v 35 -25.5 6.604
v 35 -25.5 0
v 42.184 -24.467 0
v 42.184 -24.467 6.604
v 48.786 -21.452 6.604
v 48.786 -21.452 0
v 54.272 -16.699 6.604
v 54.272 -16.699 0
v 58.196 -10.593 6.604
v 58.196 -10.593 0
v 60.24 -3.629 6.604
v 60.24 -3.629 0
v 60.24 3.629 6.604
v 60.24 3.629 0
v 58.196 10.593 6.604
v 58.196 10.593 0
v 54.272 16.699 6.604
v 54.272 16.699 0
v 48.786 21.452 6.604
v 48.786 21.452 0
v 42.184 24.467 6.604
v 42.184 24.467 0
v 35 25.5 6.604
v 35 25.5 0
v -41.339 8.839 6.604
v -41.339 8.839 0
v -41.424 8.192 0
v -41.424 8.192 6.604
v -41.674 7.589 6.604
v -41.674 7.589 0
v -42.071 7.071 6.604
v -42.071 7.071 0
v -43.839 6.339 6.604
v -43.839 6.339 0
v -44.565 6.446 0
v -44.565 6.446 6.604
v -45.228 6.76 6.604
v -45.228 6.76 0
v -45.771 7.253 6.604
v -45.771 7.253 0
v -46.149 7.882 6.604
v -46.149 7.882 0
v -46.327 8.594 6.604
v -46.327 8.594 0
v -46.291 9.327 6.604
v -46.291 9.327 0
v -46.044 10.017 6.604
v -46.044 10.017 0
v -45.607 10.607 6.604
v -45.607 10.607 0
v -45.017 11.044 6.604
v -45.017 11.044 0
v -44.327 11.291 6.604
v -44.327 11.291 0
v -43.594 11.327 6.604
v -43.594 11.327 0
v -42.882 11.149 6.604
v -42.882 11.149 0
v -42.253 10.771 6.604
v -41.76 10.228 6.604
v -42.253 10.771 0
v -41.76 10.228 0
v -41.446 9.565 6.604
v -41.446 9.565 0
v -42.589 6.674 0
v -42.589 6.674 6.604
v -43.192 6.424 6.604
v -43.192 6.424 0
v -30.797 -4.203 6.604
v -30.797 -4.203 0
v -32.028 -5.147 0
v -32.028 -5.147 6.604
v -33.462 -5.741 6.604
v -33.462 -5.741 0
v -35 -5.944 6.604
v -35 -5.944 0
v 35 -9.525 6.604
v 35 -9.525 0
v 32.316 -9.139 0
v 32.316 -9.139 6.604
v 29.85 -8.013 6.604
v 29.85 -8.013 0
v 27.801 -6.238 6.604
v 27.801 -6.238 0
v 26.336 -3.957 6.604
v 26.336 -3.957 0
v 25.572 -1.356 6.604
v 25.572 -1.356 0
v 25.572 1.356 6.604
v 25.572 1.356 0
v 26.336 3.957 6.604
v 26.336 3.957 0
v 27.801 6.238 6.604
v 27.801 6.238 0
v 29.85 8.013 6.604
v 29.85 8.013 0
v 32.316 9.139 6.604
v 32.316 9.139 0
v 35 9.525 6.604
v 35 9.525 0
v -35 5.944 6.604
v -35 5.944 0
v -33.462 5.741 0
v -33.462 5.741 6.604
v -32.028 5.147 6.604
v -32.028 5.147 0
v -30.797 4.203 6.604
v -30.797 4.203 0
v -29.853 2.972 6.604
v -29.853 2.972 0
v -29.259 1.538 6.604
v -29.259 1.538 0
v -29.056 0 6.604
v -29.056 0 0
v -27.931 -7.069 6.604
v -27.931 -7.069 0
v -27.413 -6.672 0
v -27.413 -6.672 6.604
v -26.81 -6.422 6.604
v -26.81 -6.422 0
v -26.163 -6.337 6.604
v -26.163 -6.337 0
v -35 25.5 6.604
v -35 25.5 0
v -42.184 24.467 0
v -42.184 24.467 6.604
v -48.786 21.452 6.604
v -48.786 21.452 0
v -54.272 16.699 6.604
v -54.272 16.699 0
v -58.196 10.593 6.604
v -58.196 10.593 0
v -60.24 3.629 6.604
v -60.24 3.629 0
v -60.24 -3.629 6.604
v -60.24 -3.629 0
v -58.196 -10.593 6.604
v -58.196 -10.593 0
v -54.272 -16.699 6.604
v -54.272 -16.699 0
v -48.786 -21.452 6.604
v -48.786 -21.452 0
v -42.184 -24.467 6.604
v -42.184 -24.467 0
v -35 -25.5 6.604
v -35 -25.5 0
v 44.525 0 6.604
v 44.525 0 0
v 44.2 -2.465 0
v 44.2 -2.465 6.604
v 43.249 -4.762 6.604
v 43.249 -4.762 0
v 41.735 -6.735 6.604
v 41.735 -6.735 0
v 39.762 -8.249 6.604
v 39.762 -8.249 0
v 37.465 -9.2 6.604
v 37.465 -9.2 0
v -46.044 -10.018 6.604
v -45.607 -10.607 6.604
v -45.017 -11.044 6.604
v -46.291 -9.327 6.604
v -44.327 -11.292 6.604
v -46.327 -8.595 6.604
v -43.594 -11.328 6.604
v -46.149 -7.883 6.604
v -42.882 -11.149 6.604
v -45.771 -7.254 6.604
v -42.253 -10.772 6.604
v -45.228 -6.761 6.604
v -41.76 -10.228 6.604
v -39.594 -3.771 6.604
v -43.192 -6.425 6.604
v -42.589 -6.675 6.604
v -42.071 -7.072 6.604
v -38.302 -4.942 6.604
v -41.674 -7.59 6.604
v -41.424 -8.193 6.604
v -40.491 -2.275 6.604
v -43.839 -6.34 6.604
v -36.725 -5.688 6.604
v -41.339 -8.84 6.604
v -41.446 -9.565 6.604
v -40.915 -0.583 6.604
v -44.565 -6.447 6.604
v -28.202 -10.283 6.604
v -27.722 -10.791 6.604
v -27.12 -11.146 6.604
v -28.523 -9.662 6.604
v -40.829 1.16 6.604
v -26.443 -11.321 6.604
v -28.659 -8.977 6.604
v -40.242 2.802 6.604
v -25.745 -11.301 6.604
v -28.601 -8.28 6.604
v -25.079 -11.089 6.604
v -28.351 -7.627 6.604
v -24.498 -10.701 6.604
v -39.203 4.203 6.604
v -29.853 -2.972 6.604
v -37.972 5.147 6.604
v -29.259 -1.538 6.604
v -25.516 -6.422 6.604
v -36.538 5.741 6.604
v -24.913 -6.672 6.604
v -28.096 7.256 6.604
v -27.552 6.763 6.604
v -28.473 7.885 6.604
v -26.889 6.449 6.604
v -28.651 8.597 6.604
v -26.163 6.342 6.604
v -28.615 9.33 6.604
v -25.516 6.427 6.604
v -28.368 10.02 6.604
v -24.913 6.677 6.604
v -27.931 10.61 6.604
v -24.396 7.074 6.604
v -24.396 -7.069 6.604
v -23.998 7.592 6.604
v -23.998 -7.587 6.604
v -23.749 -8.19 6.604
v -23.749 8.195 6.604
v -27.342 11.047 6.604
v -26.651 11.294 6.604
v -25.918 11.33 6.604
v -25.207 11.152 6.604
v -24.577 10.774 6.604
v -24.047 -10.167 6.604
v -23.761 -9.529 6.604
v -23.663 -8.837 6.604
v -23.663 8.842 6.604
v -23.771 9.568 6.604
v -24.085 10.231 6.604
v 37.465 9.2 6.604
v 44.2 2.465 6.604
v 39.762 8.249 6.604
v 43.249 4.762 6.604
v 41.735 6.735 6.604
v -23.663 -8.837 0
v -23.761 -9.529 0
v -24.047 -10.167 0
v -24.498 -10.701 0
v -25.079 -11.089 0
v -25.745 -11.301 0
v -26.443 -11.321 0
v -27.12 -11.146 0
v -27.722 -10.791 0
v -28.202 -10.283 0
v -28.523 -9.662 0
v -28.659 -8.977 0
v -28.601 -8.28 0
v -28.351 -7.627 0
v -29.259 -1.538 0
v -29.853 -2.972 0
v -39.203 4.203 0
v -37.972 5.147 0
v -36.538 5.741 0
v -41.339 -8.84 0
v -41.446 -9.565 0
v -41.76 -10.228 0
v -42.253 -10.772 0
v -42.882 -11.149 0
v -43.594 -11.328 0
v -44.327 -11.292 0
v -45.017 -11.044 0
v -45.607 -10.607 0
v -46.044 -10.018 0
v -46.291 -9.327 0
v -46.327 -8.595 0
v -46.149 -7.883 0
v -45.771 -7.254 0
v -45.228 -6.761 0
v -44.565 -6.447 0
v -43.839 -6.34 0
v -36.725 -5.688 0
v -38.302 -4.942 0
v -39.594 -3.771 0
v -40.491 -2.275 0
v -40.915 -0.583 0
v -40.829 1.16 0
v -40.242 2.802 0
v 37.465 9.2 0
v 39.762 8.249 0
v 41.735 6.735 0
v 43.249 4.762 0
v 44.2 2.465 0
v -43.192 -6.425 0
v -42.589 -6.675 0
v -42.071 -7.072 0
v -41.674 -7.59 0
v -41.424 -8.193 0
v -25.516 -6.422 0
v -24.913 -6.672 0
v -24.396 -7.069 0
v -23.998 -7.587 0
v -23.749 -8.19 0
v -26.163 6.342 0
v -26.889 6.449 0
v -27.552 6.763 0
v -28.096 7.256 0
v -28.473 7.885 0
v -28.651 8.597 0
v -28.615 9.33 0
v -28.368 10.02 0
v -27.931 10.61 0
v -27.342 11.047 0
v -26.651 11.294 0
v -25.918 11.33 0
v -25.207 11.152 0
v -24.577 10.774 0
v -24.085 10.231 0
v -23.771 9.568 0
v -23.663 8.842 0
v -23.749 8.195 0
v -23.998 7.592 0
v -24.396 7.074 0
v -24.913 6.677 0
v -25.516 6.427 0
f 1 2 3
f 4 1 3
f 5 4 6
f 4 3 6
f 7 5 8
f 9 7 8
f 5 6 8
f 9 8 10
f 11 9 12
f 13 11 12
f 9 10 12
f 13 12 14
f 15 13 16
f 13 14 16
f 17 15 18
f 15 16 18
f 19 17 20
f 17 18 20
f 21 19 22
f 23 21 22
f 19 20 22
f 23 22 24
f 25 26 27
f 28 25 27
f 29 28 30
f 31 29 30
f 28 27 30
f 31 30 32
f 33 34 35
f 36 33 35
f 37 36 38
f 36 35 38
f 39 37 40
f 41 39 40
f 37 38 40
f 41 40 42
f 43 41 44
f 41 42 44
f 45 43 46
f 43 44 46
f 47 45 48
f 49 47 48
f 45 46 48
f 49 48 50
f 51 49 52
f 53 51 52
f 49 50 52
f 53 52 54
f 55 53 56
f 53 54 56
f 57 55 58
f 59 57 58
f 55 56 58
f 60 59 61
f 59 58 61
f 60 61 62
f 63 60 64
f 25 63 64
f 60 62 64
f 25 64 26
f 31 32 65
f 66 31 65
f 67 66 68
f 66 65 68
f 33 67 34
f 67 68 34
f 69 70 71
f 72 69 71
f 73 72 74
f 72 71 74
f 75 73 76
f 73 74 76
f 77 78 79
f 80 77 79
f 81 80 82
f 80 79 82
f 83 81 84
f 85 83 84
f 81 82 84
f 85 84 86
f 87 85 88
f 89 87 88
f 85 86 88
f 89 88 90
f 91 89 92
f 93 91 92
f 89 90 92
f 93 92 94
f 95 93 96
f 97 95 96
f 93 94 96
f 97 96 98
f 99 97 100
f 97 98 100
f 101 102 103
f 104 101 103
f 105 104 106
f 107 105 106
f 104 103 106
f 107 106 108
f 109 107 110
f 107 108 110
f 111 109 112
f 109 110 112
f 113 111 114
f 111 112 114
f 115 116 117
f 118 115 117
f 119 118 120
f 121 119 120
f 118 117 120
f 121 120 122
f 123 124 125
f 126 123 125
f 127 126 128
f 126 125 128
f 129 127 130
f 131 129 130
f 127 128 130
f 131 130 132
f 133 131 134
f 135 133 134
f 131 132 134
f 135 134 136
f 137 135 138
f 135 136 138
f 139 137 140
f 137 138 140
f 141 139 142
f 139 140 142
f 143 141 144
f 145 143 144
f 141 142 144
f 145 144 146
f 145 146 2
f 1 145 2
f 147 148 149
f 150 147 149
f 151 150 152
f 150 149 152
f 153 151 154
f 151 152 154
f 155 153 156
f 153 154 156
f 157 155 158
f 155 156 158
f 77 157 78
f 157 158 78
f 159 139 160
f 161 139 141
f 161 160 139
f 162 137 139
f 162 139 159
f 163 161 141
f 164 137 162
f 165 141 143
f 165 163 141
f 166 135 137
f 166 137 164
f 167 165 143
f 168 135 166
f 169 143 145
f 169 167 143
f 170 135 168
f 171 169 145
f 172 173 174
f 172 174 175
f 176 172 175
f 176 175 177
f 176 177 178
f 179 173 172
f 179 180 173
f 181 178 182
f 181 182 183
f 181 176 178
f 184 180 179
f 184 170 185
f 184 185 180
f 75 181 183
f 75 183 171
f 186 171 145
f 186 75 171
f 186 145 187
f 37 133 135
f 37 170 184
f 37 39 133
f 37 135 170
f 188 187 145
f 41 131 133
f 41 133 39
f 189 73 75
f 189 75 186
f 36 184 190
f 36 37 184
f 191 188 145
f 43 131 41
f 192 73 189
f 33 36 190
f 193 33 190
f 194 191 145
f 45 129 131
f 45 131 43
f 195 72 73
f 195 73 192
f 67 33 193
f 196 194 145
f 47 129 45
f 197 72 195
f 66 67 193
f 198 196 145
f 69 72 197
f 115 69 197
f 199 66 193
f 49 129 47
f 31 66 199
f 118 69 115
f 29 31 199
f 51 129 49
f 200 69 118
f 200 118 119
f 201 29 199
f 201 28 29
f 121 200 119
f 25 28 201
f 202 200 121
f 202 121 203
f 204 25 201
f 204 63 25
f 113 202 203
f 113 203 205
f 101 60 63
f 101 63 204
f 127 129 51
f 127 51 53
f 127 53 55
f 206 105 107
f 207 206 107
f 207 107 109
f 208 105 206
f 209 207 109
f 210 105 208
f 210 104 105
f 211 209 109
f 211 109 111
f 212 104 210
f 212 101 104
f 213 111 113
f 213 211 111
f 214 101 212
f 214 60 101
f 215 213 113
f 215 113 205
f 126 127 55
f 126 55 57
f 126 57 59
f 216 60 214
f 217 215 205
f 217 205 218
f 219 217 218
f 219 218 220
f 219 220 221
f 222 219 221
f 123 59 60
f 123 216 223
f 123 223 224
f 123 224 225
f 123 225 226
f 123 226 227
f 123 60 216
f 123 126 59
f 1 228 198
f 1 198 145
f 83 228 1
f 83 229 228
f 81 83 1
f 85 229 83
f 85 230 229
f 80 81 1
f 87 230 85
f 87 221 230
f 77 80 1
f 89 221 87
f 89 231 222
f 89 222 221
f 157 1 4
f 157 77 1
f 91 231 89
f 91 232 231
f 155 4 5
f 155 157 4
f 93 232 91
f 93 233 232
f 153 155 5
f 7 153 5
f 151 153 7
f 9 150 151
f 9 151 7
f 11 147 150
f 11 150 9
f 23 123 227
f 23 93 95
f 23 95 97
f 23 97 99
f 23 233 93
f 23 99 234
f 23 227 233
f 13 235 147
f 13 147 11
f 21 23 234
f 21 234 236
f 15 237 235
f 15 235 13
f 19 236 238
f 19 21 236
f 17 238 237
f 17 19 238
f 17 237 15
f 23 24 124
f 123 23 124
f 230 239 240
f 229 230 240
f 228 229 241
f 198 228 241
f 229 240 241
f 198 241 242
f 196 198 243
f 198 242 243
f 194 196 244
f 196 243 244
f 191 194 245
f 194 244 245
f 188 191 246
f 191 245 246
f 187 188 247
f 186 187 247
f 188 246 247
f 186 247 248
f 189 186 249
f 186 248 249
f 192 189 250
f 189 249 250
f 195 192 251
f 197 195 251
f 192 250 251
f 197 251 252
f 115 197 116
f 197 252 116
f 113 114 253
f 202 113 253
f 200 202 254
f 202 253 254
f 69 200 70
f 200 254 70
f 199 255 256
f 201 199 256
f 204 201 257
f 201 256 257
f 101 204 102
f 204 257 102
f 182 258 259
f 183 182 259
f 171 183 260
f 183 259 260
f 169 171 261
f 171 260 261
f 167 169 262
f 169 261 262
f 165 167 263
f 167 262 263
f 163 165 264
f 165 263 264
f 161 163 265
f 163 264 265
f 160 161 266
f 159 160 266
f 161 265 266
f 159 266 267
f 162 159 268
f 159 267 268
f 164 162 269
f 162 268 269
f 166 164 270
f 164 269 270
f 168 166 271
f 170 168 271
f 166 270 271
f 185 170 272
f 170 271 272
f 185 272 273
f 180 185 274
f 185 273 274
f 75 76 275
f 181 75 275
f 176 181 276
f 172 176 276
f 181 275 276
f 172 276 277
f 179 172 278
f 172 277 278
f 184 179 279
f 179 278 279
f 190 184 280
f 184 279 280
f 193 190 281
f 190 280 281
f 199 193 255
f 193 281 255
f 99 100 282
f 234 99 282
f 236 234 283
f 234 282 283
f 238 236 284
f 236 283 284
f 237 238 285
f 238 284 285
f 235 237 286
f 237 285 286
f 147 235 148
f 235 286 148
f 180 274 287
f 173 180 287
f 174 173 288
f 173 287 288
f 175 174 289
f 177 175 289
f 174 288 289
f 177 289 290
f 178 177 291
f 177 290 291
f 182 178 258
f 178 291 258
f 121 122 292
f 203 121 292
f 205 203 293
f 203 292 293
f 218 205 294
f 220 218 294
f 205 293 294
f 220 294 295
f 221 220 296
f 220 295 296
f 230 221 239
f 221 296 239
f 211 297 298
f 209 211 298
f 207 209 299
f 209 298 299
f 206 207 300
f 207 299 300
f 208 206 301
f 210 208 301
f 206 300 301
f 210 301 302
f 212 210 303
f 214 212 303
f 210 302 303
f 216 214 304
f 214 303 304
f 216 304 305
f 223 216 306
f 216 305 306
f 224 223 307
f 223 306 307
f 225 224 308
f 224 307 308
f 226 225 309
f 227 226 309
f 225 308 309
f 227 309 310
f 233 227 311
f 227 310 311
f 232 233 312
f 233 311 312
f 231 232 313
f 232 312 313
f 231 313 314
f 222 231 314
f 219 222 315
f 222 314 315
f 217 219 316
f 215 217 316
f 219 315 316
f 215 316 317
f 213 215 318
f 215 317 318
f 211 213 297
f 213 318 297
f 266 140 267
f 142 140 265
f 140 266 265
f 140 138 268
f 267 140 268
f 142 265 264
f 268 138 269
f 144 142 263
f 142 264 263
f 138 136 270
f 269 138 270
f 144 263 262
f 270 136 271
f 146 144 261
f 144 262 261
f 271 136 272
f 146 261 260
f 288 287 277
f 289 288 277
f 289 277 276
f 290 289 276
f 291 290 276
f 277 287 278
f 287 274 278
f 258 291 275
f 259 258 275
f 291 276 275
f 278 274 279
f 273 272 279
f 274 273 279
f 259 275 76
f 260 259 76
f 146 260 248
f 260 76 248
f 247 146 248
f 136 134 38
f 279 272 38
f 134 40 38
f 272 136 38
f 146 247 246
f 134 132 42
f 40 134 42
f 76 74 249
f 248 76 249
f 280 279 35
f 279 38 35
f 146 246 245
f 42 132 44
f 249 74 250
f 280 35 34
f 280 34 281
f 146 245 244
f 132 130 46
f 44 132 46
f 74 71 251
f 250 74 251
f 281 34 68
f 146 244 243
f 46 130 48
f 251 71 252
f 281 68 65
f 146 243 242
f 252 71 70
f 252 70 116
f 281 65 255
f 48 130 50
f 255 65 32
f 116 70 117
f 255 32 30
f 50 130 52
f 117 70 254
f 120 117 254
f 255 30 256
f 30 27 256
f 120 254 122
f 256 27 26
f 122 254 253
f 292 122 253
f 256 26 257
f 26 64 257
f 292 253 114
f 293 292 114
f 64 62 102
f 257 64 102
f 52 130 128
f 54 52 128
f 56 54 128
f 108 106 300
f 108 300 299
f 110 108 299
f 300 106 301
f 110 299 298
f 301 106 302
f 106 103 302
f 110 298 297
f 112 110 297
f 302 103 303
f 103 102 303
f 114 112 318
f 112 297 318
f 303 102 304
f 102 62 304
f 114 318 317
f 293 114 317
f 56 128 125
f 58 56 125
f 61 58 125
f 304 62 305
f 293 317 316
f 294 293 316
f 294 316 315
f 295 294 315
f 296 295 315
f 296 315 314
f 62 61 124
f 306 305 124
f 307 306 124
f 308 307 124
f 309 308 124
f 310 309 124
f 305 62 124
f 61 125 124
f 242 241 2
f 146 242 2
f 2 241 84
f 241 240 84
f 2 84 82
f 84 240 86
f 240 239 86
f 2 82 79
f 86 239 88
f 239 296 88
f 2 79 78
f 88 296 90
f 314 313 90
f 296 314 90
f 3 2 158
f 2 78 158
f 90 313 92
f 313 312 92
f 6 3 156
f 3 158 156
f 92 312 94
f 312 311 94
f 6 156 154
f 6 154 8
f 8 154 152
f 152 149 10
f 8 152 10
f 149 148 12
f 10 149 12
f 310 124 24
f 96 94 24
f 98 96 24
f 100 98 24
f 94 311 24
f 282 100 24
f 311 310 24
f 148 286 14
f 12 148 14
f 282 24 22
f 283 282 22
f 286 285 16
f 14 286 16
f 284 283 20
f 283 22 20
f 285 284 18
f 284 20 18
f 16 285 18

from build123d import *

# Parameters (mm, degrees)
F1_DEPTH = 6.604


with BuildPart() as f1:
    # F0 (on Top) → F1 (new body)
    with BuildSketch(Plane.XY):
        with BuildLine():
            Line((-35, 5.9436), (-35, 25.5))
            ThreePointArc((-35, 25.5), (-60.5, 0), (-35, -25.5))
            Line((-35, -25.5), (-35, -5.9436))
            ThreePointArc((-35, -5.9436), (-40.49117, -2.274517), (-39.20276, 4.20276))
            ThreePointArc((-39.20276, 4.20276), (-37.274517, 5.49117), (-35, 5.9436))
        make_face()
        with BuildLine():
            ThreePointArc((-41.338835, -8.839565), (-45.606602, -10.607332), (-43.838835, -6.339565))
            ThreePointArc((-43.838835, -6.339565), (-42.071068, -7.071798), (-41.338835, -8.839565))
        make_face(mode=Mode.SUBTRACT)
        with BuildLine():
            ThreePointArc((-41.338835, 8.838835), (-41.529136, 7.882126), (-42.071068, 7.071068))
            ThreePointArc((-42.071068, 7.071068), (-42.882126, 6.529136), (-43.838835, 6.338835))
            ThreePointArc((-43.838835, 6.338835), (-45.606602, 10.606602), (-41.338835, 8.838835))
        make_face(mode=Mode.SUBTRACT)
        with BuildLine():
            Line((35, 9.525), (35, 25.5))
            Line((35, 25.5), (-35, 25.5))
            Line((-35, 25.5), (-35, 5.9436))
            ThreePointArc((-35, 5.9436), (-30.79724, 4.20276), (-29.0564, 0))
            ThreePointArc((-29.0564, 0), (-29.50883, -2.274517), (-30.79724, -4.20276))
            ThreePointArc((-30.79724, -4.20276), (-32.725483, -5.49117), (-35, -5.9436))
            Line((-35, -5.9436), (-35, -25.5))
            Line((-35, -25.5), (35, -25.5))
            Line((35, -25.5), (35, -9.525))
            ThreePointArc((35, -9.525), (25.475, 0), (35, 9.525))
        make_face()
        with BuildLine():
            ThreePointArc((-23.663428, -8.836572), (-27.120137, -11.146271), (-27.931195, -7.068805))
            ThreePointArc((-27.931195, -7.068805), (-27.120137, -6.526873), (-26.163428, -6.336572))
            ThreePointArc((-26.163428, -6.336572), (-24.395661, -7.068805), (-23.663428, -8.836572))
        make_face(mode=Mode.SUBTRACT)
        with BuildLine():
            ThreePointArc((-23.663428, 8.841828), (-24.395661, 7.074061), (-26.163428, 6.341828))
            ThreePointArc((-26.163428, 6.341828), (-27.931195, 10.609595), (-23.663428, 8.841828))
        make_face(mode=Mode.SUBTRACT)
        with BuildLine():
            ThreePointArc((35, -25.5), (60.5, 0), (35, 25.5))
            Line((35, 25.5), (35, 9.525))
            ThreePointArc((35, 9.525), (41.735192, 6.735192), (44.525, 0))
            ThreePointArc((44.525, 0), (41.735192, -6.735192), (35, -9.525))
            Line((35, -9.525), (35, -25.5))
        make_face()
    extrude(amount=F1_DEPTH)


solid = f1.part
